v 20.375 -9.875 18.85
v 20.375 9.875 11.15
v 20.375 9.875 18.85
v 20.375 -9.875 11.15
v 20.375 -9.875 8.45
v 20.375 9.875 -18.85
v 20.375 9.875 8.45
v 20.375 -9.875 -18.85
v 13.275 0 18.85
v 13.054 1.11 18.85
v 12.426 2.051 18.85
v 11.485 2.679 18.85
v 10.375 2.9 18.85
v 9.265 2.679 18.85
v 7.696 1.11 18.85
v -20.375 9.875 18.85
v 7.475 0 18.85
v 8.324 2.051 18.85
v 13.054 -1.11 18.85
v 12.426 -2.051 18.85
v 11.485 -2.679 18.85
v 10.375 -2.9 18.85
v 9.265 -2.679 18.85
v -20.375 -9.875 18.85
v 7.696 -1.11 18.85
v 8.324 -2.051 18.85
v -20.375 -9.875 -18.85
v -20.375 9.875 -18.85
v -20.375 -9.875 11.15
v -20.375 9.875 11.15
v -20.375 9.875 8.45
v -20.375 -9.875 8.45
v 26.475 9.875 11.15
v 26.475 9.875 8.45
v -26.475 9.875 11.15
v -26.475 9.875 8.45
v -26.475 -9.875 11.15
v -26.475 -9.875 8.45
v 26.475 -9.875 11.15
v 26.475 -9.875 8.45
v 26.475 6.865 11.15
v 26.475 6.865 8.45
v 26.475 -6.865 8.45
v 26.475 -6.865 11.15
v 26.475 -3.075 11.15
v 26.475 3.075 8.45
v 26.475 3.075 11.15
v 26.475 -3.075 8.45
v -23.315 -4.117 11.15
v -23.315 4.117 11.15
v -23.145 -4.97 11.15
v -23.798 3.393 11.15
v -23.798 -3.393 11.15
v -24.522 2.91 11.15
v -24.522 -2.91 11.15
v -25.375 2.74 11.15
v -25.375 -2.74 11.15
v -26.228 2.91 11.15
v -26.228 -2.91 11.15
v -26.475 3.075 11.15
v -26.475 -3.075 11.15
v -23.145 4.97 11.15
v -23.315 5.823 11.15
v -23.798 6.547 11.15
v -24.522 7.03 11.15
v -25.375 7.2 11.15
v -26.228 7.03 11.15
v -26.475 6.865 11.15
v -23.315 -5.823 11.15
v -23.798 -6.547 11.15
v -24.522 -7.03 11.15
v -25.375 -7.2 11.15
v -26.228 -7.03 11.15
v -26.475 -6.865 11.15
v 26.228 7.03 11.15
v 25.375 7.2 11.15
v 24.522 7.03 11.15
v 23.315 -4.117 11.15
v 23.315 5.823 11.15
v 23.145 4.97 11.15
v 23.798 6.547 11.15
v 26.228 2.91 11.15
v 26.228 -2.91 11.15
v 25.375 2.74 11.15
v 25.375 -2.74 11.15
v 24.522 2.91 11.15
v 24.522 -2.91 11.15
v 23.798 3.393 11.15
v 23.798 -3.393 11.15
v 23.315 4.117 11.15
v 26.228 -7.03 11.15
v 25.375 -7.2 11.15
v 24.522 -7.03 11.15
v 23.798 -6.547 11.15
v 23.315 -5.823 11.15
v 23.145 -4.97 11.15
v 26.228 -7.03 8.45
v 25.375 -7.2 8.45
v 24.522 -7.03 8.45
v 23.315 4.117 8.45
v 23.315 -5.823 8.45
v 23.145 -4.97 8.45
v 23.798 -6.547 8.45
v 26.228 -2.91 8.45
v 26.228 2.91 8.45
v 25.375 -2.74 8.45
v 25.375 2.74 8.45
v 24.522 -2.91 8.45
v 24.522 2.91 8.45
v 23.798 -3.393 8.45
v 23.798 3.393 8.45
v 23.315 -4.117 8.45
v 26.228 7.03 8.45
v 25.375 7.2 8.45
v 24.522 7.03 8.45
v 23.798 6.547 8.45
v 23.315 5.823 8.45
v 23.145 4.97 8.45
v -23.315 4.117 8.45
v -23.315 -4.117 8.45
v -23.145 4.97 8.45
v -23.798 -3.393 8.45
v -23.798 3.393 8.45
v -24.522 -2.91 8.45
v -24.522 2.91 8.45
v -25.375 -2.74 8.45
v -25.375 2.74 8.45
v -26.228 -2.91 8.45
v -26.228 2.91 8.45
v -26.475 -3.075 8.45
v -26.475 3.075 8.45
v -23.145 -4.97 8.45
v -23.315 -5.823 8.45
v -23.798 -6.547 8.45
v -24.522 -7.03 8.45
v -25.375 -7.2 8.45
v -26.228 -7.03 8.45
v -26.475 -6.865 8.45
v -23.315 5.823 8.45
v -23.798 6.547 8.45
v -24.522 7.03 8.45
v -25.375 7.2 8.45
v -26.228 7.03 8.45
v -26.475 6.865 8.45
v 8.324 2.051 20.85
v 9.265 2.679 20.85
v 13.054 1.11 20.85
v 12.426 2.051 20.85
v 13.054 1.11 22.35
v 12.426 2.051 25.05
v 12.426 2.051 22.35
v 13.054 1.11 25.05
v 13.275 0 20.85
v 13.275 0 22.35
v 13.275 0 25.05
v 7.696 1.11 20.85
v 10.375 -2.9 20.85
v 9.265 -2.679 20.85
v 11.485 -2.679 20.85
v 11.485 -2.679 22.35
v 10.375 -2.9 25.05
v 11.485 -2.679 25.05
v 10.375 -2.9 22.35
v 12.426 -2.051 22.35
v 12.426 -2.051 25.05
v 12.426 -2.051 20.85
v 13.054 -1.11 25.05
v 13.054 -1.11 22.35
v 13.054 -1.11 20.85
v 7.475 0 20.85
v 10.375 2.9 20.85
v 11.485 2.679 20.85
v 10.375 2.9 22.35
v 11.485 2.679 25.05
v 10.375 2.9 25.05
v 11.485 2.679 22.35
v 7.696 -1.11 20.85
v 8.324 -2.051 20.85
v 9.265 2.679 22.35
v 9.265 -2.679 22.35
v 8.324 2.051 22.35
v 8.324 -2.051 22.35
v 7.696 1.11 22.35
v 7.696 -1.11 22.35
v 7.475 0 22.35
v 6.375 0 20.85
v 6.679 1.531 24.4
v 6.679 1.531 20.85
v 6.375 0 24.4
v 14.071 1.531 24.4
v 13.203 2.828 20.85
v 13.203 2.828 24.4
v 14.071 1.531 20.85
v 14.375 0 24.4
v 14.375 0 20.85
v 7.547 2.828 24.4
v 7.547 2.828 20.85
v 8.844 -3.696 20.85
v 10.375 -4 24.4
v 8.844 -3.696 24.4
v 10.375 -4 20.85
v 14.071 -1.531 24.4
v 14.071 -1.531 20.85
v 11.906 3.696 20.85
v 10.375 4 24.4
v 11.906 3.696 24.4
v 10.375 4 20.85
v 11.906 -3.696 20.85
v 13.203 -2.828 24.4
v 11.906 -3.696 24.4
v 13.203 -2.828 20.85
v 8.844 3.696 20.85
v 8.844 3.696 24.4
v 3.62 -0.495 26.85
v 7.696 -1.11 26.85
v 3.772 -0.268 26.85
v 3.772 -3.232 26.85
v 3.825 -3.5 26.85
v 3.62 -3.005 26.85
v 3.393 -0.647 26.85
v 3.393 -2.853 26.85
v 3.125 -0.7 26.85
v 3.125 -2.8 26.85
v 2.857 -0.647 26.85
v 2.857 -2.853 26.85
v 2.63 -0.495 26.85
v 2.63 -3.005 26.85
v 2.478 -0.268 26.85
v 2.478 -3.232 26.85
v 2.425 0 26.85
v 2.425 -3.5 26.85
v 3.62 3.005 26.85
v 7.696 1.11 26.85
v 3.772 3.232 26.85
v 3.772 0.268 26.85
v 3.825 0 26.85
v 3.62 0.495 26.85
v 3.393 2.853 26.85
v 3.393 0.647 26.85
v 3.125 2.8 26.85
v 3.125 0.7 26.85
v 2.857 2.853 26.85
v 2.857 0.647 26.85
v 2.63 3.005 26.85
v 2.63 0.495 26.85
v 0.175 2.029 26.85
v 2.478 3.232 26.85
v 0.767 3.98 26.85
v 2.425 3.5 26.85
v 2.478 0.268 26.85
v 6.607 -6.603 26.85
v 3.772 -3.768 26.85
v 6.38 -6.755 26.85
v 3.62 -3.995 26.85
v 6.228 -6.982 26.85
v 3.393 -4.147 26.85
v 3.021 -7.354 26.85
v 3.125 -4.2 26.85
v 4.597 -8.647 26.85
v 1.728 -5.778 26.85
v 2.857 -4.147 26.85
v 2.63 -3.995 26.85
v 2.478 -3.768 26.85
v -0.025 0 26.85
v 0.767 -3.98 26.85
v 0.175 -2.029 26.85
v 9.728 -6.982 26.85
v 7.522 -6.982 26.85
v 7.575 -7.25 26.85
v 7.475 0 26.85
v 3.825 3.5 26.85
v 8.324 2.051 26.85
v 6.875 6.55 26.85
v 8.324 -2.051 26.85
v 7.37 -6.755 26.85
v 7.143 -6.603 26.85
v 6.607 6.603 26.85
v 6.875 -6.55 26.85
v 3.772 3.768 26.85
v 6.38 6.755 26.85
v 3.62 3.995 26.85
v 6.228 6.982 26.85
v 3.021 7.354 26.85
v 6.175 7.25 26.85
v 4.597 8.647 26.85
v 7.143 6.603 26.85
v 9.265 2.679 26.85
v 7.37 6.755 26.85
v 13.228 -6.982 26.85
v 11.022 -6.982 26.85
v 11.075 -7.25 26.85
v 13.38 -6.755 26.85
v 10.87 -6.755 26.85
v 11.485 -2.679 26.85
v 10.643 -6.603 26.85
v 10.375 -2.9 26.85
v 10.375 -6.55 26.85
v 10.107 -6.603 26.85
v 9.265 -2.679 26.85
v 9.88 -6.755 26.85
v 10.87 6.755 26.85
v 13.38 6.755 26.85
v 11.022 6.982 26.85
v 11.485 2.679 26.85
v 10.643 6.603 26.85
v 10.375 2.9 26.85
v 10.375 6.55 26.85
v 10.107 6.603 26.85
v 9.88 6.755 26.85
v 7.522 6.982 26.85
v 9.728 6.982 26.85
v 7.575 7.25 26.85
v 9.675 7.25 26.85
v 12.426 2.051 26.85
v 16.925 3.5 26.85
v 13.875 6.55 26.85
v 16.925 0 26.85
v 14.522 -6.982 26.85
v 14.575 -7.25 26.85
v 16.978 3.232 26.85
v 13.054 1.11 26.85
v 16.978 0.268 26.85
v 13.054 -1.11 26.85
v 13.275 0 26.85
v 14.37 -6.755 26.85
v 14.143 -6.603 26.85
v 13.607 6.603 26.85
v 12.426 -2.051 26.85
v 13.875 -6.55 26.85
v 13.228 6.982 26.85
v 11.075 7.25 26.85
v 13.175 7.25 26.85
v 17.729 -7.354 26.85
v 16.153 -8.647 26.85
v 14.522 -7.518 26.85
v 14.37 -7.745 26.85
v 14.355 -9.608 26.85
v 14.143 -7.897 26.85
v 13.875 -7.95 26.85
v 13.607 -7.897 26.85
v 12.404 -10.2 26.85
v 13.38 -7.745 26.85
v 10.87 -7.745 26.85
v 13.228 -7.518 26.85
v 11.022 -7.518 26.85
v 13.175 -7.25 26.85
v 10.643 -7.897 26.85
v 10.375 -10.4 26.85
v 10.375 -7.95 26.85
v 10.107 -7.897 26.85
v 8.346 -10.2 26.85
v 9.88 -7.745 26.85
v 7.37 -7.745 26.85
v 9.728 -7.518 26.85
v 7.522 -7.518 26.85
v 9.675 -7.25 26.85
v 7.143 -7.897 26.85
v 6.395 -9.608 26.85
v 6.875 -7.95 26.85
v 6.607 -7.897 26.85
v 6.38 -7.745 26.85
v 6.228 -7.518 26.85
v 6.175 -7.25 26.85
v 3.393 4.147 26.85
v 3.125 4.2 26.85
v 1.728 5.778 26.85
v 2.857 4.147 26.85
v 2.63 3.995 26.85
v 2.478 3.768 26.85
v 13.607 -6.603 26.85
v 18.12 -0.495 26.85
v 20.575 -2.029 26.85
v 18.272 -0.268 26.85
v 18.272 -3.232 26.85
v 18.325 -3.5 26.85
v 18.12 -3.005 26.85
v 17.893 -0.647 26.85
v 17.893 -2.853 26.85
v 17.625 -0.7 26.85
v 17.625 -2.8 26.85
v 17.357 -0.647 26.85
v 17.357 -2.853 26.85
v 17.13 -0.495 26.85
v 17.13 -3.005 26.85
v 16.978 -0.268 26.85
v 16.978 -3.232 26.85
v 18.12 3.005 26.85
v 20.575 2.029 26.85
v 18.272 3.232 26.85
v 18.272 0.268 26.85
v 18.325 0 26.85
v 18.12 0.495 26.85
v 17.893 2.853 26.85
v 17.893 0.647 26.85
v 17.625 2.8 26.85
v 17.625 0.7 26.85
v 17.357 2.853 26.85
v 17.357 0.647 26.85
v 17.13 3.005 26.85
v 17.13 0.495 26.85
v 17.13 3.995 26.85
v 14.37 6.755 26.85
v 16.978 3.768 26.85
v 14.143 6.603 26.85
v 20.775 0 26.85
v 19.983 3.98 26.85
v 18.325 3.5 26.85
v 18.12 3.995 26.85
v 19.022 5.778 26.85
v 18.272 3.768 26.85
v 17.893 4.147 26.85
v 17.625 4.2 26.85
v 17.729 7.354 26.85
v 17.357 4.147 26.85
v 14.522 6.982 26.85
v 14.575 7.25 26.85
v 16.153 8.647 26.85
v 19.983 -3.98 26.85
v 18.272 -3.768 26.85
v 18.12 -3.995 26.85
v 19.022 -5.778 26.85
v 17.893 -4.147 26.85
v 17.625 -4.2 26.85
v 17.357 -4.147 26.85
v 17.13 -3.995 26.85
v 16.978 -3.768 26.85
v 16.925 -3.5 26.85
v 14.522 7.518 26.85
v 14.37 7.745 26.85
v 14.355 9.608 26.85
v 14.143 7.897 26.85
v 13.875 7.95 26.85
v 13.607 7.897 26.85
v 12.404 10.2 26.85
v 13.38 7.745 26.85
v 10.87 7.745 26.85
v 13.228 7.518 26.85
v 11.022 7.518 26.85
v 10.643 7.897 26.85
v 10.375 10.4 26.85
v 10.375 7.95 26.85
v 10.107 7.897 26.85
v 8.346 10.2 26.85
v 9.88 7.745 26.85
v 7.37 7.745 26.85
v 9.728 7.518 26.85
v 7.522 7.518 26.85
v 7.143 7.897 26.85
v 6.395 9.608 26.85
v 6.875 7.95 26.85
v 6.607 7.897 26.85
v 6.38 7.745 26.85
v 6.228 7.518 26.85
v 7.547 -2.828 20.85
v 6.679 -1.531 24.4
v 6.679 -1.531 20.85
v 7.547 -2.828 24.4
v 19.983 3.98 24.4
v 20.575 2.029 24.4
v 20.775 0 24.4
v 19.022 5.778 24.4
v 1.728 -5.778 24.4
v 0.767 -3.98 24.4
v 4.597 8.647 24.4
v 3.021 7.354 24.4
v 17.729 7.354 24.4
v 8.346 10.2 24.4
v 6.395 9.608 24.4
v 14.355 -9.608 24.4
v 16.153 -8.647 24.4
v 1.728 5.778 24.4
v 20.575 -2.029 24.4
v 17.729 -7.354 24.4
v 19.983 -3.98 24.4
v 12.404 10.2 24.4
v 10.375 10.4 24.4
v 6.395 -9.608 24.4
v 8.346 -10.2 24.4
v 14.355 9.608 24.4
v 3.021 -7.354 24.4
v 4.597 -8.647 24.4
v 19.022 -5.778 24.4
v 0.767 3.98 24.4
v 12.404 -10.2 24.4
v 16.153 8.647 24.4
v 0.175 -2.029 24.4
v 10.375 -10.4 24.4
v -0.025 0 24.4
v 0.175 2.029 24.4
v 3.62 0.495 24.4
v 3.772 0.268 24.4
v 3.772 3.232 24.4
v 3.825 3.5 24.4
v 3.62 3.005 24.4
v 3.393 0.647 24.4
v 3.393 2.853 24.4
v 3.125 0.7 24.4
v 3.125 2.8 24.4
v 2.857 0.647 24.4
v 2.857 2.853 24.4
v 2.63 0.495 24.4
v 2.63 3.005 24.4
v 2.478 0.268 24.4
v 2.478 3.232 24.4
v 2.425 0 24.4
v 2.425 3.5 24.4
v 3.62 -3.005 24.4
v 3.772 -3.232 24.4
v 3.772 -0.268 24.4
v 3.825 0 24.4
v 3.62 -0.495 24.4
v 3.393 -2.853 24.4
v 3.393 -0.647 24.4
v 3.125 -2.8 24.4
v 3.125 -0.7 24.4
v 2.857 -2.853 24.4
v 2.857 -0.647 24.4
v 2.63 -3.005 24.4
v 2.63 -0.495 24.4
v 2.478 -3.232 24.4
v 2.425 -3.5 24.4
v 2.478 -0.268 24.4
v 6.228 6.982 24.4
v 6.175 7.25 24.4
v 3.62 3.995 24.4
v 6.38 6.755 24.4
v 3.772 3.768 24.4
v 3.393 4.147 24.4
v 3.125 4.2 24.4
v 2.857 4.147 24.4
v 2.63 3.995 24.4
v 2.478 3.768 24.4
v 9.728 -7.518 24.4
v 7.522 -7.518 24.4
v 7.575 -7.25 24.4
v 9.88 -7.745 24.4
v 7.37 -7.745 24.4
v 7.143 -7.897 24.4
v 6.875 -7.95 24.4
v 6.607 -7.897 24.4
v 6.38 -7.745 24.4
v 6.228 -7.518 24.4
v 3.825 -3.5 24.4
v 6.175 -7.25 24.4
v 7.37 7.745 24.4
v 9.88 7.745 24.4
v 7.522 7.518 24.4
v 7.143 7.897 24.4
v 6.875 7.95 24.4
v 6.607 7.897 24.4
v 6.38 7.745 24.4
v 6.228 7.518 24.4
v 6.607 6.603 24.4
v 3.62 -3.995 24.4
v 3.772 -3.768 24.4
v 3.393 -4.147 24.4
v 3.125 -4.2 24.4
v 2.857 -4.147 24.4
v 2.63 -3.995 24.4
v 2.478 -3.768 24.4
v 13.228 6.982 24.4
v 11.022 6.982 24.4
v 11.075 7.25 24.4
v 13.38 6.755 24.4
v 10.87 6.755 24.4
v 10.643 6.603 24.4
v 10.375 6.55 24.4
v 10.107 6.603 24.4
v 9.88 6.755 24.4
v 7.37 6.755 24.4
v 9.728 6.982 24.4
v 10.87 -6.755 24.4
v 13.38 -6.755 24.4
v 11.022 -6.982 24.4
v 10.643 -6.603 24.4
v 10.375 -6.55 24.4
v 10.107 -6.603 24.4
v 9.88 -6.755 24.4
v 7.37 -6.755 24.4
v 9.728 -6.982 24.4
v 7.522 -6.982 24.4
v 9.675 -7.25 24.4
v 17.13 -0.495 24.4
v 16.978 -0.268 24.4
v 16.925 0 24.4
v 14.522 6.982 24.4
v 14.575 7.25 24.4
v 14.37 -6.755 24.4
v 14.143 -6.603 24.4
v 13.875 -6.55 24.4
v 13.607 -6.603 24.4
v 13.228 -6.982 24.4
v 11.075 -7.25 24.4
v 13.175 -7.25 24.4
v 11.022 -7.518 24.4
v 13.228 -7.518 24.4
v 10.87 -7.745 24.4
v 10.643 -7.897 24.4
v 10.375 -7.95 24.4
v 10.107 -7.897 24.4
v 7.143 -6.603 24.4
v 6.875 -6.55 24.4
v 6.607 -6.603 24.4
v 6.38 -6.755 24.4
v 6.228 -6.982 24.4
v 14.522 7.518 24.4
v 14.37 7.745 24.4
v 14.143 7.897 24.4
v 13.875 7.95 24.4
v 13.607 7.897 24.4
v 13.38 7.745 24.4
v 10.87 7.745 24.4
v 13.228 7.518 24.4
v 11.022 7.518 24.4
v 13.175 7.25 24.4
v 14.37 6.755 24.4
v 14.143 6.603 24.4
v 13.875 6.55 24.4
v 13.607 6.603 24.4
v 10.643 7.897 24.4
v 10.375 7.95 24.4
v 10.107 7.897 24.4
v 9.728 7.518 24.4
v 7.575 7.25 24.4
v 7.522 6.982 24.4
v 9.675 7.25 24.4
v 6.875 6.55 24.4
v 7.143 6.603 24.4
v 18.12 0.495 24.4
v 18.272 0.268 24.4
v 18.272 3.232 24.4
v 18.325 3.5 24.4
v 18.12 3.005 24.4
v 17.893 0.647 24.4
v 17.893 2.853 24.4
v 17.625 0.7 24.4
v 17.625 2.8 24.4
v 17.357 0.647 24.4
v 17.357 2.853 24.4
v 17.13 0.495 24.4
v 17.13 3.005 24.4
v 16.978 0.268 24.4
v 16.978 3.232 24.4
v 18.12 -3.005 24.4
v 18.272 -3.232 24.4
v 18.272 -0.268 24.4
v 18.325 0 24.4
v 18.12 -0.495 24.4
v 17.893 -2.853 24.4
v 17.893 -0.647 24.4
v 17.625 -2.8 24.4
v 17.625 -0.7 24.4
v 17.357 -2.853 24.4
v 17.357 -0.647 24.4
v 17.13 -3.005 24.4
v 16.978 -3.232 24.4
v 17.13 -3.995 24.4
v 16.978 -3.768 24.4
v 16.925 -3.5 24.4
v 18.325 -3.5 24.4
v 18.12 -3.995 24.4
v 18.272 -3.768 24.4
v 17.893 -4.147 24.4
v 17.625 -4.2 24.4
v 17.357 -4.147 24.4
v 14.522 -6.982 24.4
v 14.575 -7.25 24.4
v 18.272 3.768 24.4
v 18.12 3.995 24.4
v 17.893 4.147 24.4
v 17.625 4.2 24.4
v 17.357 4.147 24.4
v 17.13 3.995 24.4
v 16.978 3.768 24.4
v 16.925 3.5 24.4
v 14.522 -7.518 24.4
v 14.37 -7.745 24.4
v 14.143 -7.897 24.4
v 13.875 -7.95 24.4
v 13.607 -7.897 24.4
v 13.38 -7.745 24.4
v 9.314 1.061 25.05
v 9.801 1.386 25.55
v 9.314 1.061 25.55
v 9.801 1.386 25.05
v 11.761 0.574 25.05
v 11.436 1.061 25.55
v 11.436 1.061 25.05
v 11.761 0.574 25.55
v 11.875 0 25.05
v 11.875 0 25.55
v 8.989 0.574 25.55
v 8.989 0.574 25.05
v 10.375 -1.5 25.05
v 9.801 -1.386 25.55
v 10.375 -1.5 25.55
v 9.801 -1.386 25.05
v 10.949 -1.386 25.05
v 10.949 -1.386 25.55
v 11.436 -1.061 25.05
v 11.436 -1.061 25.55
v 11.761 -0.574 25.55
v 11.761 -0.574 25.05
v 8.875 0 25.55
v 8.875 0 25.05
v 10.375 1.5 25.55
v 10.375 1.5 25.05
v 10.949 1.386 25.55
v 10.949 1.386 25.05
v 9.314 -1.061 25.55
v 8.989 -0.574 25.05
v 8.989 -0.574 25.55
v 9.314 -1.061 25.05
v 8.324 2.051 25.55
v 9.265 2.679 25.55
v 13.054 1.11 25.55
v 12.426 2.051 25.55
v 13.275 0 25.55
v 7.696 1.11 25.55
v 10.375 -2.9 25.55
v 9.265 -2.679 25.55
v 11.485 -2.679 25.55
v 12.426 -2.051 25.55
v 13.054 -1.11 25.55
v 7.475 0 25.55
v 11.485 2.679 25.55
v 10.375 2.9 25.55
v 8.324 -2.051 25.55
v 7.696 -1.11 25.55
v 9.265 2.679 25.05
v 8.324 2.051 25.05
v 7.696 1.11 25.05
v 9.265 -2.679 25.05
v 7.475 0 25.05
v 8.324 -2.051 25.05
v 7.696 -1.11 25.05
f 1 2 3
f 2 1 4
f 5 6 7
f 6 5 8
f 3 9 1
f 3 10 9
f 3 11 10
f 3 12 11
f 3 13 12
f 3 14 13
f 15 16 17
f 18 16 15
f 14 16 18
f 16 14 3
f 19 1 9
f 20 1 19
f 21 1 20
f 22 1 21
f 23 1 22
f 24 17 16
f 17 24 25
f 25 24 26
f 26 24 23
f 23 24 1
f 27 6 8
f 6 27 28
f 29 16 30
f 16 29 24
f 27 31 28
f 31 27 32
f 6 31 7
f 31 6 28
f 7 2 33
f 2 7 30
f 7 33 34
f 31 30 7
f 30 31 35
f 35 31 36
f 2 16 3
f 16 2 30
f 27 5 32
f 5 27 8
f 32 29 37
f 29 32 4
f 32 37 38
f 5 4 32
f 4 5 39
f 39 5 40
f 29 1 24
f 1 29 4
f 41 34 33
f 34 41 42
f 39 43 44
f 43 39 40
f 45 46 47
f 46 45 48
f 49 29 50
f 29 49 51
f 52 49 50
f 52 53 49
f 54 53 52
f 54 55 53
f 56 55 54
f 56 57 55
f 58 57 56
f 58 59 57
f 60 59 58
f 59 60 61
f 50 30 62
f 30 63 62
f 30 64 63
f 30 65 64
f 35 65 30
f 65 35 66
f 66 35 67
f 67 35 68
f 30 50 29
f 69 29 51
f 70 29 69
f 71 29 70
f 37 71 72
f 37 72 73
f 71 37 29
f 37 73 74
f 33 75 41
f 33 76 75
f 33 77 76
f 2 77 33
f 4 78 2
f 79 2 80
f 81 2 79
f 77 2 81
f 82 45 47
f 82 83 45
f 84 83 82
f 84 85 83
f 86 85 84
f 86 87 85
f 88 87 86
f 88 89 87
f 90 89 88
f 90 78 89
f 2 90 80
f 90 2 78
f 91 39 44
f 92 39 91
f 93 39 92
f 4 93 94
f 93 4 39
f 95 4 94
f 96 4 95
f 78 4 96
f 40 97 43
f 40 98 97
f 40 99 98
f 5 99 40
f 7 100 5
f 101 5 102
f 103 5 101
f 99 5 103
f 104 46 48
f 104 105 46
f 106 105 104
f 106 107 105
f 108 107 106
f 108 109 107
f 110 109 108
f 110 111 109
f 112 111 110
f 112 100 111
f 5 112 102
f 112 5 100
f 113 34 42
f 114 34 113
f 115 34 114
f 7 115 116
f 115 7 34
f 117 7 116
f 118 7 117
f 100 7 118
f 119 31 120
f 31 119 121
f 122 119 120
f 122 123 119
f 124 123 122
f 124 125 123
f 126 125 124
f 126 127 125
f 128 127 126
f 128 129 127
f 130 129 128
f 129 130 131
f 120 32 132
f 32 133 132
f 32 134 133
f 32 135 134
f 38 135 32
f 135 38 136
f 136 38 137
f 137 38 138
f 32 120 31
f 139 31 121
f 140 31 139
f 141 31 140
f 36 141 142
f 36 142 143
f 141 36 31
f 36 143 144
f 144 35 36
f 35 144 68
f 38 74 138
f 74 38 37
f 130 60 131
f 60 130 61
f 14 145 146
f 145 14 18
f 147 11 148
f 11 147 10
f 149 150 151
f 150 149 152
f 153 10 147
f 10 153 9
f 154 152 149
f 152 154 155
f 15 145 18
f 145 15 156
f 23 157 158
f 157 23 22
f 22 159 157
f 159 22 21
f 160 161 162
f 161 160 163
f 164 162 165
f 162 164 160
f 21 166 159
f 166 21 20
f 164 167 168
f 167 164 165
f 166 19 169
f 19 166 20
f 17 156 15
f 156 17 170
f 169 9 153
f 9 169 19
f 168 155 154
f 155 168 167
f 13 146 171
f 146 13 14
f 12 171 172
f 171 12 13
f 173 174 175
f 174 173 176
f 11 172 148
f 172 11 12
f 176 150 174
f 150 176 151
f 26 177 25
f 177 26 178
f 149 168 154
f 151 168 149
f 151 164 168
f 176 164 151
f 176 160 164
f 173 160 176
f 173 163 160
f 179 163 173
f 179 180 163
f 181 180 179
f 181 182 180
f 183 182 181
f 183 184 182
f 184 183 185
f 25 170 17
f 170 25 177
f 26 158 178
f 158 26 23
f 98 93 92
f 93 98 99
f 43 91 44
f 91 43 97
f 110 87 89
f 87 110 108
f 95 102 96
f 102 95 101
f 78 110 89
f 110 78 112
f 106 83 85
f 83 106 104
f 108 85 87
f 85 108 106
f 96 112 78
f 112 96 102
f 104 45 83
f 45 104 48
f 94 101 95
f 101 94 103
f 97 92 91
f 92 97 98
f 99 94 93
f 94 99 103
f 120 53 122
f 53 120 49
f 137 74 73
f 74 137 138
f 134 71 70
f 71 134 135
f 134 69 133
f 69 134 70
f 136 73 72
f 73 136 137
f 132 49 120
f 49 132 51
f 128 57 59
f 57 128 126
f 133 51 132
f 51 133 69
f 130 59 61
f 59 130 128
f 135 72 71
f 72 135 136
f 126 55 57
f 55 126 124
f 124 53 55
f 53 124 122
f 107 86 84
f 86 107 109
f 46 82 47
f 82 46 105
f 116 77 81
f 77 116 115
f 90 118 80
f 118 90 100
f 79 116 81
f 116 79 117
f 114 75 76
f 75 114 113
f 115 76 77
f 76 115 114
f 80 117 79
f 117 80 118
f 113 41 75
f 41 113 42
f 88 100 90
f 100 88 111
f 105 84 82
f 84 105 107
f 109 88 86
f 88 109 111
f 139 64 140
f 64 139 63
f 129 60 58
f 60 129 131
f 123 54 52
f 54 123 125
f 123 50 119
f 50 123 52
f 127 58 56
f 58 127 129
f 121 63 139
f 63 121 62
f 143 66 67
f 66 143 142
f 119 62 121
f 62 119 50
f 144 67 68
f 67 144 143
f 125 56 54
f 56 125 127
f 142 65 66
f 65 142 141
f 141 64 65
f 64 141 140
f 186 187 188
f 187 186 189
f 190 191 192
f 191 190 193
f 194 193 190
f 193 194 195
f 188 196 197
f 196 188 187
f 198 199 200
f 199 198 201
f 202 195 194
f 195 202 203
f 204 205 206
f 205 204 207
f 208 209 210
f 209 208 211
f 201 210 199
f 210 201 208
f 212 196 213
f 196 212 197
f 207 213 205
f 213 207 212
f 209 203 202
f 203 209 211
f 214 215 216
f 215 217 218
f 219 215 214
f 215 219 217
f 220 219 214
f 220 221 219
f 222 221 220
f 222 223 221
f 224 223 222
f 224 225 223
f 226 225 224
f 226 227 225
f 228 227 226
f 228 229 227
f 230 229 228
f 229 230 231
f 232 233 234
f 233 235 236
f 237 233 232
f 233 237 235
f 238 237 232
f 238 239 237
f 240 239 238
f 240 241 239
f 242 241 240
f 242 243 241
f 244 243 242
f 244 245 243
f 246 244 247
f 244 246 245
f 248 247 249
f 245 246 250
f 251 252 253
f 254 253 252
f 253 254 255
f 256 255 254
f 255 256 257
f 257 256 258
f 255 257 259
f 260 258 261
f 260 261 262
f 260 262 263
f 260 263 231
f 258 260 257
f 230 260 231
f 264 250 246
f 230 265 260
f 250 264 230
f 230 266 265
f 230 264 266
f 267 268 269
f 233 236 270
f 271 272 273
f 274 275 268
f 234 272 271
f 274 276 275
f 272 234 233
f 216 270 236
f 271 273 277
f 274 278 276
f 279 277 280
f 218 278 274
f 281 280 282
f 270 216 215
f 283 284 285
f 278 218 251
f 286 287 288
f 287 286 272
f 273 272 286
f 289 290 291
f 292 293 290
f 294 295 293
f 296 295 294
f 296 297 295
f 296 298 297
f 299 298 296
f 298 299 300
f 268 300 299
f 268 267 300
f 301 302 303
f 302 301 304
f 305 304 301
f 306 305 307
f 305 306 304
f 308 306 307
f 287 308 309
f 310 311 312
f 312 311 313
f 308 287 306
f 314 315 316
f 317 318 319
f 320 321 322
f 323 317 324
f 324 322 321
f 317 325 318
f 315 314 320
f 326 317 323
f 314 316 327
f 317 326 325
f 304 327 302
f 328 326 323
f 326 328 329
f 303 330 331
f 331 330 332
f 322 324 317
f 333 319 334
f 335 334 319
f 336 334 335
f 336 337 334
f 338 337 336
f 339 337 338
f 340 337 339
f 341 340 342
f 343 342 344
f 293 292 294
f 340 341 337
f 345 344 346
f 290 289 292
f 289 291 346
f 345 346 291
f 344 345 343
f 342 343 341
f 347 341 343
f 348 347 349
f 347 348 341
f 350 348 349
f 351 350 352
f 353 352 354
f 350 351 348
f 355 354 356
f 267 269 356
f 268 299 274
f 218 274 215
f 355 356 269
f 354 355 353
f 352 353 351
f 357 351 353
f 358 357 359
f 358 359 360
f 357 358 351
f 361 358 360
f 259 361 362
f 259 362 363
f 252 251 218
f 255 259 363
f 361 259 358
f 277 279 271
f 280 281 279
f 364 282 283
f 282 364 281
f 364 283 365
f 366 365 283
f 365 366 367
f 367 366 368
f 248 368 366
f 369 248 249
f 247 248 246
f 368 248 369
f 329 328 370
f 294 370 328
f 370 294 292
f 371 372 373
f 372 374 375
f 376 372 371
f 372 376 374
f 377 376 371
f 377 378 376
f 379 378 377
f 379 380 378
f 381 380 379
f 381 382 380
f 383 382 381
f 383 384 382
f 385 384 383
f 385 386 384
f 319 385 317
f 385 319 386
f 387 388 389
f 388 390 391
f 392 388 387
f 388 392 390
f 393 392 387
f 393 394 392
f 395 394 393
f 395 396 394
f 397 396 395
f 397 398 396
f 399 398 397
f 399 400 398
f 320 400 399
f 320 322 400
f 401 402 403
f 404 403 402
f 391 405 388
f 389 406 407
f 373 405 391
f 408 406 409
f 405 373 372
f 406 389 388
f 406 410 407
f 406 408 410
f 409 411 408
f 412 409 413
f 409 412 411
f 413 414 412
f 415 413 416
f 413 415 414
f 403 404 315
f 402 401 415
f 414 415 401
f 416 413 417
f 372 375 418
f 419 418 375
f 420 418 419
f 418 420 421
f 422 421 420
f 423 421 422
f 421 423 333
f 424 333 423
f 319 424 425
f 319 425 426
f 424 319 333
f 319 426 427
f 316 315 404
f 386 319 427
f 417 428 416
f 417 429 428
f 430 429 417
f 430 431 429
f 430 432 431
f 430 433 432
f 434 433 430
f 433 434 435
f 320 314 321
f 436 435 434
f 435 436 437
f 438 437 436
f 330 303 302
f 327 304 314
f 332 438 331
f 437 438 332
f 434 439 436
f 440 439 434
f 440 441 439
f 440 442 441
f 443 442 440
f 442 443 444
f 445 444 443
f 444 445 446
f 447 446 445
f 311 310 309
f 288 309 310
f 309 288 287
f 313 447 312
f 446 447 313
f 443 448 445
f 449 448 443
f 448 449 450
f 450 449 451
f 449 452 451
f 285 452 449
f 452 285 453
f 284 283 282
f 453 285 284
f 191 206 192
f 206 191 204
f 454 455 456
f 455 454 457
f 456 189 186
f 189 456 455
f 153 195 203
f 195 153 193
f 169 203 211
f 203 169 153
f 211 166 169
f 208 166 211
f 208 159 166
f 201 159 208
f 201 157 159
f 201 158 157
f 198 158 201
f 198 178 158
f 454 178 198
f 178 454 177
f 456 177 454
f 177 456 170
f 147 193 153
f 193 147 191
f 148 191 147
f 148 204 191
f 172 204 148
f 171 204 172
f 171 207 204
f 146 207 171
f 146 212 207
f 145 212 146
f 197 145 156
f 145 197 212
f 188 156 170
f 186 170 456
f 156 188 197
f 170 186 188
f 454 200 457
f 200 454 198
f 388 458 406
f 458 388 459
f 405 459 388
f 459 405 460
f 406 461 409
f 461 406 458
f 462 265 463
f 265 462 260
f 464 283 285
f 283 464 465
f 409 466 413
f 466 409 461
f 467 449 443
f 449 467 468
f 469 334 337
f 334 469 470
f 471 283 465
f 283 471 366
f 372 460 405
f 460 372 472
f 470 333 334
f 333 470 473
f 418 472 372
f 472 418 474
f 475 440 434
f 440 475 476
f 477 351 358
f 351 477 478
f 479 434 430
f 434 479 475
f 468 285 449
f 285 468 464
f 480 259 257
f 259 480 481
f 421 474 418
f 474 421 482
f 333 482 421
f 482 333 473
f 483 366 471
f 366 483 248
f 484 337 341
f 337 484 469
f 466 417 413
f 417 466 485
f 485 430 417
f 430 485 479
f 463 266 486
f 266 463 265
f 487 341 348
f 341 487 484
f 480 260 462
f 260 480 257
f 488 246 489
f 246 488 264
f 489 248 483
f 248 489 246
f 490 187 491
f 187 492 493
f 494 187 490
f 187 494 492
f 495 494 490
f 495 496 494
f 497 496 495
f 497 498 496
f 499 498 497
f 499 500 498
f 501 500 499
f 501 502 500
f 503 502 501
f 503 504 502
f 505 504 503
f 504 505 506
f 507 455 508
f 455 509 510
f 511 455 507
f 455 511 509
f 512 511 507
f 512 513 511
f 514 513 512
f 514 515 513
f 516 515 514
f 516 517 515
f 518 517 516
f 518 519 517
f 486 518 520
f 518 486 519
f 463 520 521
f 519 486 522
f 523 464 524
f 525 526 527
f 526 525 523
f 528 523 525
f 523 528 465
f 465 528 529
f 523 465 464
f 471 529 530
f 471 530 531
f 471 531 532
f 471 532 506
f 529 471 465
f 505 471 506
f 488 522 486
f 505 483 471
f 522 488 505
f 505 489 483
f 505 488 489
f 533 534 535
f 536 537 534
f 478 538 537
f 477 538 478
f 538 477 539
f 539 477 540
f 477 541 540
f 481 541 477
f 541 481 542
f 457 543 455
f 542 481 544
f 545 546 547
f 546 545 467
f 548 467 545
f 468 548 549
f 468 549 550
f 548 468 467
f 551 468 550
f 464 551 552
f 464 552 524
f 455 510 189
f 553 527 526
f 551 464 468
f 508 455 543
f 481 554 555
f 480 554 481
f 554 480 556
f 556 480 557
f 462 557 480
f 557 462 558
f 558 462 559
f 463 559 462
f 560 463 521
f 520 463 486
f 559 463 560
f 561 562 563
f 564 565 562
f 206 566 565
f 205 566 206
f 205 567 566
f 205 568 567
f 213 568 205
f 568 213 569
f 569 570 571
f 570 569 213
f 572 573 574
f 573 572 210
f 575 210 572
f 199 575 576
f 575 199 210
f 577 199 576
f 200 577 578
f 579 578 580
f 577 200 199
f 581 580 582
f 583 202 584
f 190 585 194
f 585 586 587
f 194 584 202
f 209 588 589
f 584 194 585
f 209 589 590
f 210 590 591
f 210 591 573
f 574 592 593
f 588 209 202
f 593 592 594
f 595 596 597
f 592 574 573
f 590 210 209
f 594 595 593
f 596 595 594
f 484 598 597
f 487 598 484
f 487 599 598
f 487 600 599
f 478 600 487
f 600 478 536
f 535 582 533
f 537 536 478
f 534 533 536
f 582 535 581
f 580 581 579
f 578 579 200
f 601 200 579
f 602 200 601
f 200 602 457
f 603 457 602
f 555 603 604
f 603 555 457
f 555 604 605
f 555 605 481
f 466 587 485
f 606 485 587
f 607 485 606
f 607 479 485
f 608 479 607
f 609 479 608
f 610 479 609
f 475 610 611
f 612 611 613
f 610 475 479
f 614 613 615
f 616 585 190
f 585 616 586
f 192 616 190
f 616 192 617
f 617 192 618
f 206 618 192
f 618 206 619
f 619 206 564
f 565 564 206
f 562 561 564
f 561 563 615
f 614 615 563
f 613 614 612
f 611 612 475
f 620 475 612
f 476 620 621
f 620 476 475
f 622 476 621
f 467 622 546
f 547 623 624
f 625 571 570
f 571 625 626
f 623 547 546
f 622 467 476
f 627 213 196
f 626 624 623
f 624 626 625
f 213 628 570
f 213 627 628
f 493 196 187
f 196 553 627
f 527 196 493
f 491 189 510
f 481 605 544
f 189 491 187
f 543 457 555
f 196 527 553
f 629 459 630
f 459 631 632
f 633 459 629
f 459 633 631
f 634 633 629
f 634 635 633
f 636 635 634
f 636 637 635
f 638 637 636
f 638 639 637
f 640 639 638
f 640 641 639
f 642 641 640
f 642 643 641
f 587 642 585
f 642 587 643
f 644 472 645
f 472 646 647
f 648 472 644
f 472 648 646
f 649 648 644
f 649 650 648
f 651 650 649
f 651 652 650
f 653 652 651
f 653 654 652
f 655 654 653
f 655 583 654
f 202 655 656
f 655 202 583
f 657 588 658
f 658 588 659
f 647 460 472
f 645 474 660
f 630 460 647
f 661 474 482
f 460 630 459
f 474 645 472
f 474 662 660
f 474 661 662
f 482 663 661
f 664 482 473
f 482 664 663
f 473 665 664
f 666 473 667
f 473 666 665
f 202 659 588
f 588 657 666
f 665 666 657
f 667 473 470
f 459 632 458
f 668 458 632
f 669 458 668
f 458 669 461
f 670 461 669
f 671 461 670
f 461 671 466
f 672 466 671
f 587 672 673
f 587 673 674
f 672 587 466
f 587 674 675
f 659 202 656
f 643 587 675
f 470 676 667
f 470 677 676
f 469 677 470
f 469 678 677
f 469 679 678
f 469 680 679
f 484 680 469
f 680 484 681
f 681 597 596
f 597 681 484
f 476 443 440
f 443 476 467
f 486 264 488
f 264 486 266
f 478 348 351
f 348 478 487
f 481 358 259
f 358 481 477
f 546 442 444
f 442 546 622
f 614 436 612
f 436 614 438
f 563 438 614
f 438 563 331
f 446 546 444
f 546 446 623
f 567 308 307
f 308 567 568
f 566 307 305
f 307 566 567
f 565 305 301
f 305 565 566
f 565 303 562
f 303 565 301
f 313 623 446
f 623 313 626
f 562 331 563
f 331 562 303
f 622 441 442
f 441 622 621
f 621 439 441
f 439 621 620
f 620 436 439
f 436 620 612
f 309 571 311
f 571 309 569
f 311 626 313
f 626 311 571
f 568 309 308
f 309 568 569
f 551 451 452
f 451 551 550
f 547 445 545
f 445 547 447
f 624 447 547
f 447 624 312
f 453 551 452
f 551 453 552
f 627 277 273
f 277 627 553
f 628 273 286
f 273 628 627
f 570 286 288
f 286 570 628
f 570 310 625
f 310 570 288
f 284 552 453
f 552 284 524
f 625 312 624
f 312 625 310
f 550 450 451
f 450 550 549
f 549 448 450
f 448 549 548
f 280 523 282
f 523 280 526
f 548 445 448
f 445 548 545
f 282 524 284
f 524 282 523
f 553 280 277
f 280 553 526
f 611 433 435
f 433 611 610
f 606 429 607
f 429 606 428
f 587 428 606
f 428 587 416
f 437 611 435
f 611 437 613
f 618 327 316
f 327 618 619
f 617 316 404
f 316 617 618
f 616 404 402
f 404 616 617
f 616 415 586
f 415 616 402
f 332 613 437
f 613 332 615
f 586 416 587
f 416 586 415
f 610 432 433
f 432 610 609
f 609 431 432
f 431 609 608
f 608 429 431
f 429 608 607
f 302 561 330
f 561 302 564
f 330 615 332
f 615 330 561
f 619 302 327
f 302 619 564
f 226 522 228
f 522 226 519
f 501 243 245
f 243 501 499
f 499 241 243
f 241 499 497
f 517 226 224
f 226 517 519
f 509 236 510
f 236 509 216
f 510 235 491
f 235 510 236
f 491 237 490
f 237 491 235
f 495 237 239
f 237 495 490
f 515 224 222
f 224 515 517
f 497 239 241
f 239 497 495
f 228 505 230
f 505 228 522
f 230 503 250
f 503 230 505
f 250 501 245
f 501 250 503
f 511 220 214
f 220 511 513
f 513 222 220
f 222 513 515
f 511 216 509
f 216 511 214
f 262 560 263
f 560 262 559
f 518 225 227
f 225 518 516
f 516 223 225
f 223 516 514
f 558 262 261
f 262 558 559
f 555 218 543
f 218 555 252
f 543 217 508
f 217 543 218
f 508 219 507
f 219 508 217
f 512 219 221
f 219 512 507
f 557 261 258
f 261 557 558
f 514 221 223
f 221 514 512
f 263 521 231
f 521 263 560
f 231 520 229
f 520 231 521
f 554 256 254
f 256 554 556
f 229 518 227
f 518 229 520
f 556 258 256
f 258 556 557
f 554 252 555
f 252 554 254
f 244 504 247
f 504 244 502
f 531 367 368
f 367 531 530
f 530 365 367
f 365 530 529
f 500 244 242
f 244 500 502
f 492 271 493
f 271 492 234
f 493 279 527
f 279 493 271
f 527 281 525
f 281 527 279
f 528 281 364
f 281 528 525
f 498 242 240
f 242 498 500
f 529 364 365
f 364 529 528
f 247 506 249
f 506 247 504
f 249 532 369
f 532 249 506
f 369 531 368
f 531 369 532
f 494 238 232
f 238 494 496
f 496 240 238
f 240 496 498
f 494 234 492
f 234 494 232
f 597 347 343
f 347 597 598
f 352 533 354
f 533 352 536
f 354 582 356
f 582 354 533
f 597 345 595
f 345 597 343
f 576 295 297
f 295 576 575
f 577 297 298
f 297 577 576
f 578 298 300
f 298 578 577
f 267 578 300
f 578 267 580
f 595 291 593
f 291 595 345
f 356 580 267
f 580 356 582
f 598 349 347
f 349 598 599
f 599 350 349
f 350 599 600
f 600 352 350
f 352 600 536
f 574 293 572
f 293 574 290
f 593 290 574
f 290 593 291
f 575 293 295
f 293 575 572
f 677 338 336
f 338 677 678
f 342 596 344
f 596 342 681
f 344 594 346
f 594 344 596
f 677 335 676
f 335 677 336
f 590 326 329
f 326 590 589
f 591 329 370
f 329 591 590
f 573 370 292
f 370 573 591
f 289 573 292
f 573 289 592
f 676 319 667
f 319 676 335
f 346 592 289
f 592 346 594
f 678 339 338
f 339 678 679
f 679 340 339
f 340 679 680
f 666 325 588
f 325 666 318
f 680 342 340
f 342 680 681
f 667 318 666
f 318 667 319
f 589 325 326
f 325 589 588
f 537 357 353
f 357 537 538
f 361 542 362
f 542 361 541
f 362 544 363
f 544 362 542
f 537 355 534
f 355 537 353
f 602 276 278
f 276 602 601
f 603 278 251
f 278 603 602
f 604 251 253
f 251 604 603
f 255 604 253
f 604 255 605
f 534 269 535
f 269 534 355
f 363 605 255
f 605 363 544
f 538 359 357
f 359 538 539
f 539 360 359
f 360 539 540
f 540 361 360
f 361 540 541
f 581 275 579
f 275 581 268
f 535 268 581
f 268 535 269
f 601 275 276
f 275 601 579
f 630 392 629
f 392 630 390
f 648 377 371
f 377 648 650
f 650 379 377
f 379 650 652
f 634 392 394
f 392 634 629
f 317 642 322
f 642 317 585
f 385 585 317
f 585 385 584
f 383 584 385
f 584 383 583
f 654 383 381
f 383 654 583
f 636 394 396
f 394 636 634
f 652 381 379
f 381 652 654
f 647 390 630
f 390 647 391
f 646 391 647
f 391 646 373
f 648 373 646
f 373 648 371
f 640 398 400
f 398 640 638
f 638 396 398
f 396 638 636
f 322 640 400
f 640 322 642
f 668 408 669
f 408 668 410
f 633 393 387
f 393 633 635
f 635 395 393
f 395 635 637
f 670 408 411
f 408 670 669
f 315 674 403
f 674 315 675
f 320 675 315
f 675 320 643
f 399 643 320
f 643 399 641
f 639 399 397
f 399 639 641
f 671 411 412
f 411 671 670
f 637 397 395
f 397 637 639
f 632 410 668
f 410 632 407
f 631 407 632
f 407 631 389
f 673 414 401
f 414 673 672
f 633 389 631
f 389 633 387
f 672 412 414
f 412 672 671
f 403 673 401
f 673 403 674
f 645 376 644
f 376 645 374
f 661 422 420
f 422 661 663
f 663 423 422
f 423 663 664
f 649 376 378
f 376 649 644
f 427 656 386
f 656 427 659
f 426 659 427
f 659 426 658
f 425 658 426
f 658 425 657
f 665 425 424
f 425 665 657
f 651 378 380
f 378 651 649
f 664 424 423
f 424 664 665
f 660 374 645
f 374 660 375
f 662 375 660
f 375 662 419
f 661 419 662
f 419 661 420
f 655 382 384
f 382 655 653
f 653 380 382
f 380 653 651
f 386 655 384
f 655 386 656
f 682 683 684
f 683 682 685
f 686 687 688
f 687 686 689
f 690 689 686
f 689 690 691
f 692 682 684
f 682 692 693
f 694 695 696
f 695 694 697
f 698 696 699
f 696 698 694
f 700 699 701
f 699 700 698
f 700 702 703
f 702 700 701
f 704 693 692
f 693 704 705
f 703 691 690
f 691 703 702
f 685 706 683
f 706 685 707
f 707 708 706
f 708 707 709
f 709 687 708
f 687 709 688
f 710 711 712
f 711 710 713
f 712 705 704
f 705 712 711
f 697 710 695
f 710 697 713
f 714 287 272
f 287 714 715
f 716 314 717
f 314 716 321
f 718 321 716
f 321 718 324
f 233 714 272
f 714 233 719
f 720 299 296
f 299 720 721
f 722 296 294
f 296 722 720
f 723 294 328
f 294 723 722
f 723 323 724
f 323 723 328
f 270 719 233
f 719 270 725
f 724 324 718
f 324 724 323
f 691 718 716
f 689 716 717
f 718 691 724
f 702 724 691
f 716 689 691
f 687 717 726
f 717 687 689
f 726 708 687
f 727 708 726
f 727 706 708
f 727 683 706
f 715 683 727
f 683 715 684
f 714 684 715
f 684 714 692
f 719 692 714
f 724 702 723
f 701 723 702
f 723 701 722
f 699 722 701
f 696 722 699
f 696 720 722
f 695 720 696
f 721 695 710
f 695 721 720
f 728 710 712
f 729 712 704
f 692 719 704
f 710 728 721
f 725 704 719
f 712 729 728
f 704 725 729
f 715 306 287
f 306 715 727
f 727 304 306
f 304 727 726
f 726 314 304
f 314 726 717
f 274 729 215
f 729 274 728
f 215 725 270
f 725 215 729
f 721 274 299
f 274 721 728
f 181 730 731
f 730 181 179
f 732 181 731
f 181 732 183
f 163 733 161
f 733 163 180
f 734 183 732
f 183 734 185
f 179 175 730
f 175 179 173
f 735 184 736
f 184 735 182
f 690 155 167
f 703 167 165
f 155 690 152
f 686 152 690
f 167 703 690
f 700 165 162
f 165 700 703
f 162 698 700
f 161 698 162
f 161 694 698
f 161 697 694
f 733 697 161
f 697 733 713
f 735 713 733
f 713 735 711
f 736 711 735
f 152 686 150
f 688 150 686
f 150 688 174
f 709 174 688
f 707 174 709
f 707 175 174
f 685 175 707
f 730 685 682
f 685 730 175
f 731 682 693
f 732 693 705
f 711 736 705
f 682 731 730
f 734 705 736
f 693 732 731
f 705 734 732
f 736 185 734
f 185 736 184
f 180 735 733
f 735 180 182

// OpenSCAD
// Author Michael Marques (DrYerzinia)

module parallax_continuous_rotation_servo(){

	depth = 37.7;
	length = 40.75;
	width = 19.75;

	mount_height = 2.7;
	mount_extent = 6.1;
	mount_from_top = 7.7;

	mount_hole_diameter = 4.46;
	mount_hole_spacing = 14.4 - mount_hole_diameter;

	shaft_diameter = 5.8;
	shaft_offset = 10;
	shaft_length = 3.5;

	module mounting_hole(){

			translate(
				[
					length / 2 + 5,
					mount_hole_spacing / 2,
					depth / 2 - mount_height / 2 - mount_from_top
				]
				)
				cylinder(
					h = mount_height + 1,
					r = mount_hole_diameter / 2,
					$fn=16,
					center = true);
	}

	difference(){
		union(){

			// Body
			cube([length,width,depth], center = true);

			// Mounting wings
			translate(
				[
					0,
					0,
					depth / 2 - mount_height / 2 - mount_from_top
				])
				cube(
					[
						length + mount_extent * 2,
						width,
						mount_height
					],
					center = true);

			// Shaft
			translate(
				[
					length / 2 - shaft_offset,
					0,
					depth / 2 + shaft_length / 2
				]
				)
				cylinder(
					h = shaft_length,
					r = shaft_diameter / 2,
					$fn = 16,
					center = true
				);

		}
		union(){

			// Mounting Holes
			mounting_hole();
			mirror()
				mounting_hole();

			translate([0,-mount_hole_spacing,0]){
				mounting_hole();
				mirror()
					mounting_hole();
			}
		}
	}

}

module translate_shaft(){

	depth = 37.7;
	length = 40.75;

	shaft_offset = 10;

	translate(
		[
			length / 2 - shaft_offset,
			0,
			depth / 2
		])
		children();
}

module round_servo_attachment(){

	height = 6;
	diameter = 20.8;
	inner_diameter = 8.6;
	plate_thickness = 2.45;

	float = 2;

	depth = 37.7;
	length = 40.75;

	shaft_offset = 10;

	plate_hole_spacing = 14.5;
	plate_hole_diameter = 1.4;
	plate_hole_minor_spacing = 3.5;

	screw_hole_diameter = 3;

	inner_diameter = 8;
	
	top_depth = 1.8;
	bottom_depth = 3.4;

	void_diameter = 5.8;

	module plate_hole(){
		cylinder(
			h = plate_thickness + 1,
			r = plate_hole_diameter / 2,
			$fn = 16,
			center = true
		);
	}

	module plate_hole_group(){
		translate([0, 0, height / 2 - plate_thickness / 2]){
			translate([0, plate_hole_spacing / 2, 0]){
					plate_hole();
					translate([- plate_hole_minor_spacing, 0, 0])
						plate_hole();
					translate([  plate_hole_minor_spacing, 0, 0])
						plate_hole();
			}
		}
	}

	translate(
		[
			length / 2 - shaft_offset,
			0,
			depth / 2 + height / 2 + float
		]
		)
		difference(){

			union(){

				// inner shaft
				cylinder(
					h = height,
					r = inner_diameter / 2,
					$fn = 16,
					center = true
				);

				// top
				translate([0, 0, height / 2 - plate_thickness / 2])
					cylinder(
						h = plate_thickness,
						r = diameter / 2,
						$fn = 32,
						center = true
					);
			}

			union(){

				// plate holes
				for(ang = [0:3]){
					rotate([0,0, ang * 90])
						plate_hole_group();
				}

				// screw hole
				cylinder(
					h = height + 1,
					r = screw_hole_diameter / 2,
					$fn = 16,
					center = true
				);

				// inner voids
				translate([0, 0, height / 2 - top_depth / 2 + 1])
					cylinder(
						h = top_depth + 1,
						r = void_diameter / 2,
						$fn = 16,
						center = true
					);
				translate([0, 0, -1])
					cylinder(
						h = bottom_depth + 1,
						r = void_diameter / 2,
						$fn = 16,
						center = true
					);

			}

		}

}

parallax_continuous_rotation_servo();
round_servo_attachment();
